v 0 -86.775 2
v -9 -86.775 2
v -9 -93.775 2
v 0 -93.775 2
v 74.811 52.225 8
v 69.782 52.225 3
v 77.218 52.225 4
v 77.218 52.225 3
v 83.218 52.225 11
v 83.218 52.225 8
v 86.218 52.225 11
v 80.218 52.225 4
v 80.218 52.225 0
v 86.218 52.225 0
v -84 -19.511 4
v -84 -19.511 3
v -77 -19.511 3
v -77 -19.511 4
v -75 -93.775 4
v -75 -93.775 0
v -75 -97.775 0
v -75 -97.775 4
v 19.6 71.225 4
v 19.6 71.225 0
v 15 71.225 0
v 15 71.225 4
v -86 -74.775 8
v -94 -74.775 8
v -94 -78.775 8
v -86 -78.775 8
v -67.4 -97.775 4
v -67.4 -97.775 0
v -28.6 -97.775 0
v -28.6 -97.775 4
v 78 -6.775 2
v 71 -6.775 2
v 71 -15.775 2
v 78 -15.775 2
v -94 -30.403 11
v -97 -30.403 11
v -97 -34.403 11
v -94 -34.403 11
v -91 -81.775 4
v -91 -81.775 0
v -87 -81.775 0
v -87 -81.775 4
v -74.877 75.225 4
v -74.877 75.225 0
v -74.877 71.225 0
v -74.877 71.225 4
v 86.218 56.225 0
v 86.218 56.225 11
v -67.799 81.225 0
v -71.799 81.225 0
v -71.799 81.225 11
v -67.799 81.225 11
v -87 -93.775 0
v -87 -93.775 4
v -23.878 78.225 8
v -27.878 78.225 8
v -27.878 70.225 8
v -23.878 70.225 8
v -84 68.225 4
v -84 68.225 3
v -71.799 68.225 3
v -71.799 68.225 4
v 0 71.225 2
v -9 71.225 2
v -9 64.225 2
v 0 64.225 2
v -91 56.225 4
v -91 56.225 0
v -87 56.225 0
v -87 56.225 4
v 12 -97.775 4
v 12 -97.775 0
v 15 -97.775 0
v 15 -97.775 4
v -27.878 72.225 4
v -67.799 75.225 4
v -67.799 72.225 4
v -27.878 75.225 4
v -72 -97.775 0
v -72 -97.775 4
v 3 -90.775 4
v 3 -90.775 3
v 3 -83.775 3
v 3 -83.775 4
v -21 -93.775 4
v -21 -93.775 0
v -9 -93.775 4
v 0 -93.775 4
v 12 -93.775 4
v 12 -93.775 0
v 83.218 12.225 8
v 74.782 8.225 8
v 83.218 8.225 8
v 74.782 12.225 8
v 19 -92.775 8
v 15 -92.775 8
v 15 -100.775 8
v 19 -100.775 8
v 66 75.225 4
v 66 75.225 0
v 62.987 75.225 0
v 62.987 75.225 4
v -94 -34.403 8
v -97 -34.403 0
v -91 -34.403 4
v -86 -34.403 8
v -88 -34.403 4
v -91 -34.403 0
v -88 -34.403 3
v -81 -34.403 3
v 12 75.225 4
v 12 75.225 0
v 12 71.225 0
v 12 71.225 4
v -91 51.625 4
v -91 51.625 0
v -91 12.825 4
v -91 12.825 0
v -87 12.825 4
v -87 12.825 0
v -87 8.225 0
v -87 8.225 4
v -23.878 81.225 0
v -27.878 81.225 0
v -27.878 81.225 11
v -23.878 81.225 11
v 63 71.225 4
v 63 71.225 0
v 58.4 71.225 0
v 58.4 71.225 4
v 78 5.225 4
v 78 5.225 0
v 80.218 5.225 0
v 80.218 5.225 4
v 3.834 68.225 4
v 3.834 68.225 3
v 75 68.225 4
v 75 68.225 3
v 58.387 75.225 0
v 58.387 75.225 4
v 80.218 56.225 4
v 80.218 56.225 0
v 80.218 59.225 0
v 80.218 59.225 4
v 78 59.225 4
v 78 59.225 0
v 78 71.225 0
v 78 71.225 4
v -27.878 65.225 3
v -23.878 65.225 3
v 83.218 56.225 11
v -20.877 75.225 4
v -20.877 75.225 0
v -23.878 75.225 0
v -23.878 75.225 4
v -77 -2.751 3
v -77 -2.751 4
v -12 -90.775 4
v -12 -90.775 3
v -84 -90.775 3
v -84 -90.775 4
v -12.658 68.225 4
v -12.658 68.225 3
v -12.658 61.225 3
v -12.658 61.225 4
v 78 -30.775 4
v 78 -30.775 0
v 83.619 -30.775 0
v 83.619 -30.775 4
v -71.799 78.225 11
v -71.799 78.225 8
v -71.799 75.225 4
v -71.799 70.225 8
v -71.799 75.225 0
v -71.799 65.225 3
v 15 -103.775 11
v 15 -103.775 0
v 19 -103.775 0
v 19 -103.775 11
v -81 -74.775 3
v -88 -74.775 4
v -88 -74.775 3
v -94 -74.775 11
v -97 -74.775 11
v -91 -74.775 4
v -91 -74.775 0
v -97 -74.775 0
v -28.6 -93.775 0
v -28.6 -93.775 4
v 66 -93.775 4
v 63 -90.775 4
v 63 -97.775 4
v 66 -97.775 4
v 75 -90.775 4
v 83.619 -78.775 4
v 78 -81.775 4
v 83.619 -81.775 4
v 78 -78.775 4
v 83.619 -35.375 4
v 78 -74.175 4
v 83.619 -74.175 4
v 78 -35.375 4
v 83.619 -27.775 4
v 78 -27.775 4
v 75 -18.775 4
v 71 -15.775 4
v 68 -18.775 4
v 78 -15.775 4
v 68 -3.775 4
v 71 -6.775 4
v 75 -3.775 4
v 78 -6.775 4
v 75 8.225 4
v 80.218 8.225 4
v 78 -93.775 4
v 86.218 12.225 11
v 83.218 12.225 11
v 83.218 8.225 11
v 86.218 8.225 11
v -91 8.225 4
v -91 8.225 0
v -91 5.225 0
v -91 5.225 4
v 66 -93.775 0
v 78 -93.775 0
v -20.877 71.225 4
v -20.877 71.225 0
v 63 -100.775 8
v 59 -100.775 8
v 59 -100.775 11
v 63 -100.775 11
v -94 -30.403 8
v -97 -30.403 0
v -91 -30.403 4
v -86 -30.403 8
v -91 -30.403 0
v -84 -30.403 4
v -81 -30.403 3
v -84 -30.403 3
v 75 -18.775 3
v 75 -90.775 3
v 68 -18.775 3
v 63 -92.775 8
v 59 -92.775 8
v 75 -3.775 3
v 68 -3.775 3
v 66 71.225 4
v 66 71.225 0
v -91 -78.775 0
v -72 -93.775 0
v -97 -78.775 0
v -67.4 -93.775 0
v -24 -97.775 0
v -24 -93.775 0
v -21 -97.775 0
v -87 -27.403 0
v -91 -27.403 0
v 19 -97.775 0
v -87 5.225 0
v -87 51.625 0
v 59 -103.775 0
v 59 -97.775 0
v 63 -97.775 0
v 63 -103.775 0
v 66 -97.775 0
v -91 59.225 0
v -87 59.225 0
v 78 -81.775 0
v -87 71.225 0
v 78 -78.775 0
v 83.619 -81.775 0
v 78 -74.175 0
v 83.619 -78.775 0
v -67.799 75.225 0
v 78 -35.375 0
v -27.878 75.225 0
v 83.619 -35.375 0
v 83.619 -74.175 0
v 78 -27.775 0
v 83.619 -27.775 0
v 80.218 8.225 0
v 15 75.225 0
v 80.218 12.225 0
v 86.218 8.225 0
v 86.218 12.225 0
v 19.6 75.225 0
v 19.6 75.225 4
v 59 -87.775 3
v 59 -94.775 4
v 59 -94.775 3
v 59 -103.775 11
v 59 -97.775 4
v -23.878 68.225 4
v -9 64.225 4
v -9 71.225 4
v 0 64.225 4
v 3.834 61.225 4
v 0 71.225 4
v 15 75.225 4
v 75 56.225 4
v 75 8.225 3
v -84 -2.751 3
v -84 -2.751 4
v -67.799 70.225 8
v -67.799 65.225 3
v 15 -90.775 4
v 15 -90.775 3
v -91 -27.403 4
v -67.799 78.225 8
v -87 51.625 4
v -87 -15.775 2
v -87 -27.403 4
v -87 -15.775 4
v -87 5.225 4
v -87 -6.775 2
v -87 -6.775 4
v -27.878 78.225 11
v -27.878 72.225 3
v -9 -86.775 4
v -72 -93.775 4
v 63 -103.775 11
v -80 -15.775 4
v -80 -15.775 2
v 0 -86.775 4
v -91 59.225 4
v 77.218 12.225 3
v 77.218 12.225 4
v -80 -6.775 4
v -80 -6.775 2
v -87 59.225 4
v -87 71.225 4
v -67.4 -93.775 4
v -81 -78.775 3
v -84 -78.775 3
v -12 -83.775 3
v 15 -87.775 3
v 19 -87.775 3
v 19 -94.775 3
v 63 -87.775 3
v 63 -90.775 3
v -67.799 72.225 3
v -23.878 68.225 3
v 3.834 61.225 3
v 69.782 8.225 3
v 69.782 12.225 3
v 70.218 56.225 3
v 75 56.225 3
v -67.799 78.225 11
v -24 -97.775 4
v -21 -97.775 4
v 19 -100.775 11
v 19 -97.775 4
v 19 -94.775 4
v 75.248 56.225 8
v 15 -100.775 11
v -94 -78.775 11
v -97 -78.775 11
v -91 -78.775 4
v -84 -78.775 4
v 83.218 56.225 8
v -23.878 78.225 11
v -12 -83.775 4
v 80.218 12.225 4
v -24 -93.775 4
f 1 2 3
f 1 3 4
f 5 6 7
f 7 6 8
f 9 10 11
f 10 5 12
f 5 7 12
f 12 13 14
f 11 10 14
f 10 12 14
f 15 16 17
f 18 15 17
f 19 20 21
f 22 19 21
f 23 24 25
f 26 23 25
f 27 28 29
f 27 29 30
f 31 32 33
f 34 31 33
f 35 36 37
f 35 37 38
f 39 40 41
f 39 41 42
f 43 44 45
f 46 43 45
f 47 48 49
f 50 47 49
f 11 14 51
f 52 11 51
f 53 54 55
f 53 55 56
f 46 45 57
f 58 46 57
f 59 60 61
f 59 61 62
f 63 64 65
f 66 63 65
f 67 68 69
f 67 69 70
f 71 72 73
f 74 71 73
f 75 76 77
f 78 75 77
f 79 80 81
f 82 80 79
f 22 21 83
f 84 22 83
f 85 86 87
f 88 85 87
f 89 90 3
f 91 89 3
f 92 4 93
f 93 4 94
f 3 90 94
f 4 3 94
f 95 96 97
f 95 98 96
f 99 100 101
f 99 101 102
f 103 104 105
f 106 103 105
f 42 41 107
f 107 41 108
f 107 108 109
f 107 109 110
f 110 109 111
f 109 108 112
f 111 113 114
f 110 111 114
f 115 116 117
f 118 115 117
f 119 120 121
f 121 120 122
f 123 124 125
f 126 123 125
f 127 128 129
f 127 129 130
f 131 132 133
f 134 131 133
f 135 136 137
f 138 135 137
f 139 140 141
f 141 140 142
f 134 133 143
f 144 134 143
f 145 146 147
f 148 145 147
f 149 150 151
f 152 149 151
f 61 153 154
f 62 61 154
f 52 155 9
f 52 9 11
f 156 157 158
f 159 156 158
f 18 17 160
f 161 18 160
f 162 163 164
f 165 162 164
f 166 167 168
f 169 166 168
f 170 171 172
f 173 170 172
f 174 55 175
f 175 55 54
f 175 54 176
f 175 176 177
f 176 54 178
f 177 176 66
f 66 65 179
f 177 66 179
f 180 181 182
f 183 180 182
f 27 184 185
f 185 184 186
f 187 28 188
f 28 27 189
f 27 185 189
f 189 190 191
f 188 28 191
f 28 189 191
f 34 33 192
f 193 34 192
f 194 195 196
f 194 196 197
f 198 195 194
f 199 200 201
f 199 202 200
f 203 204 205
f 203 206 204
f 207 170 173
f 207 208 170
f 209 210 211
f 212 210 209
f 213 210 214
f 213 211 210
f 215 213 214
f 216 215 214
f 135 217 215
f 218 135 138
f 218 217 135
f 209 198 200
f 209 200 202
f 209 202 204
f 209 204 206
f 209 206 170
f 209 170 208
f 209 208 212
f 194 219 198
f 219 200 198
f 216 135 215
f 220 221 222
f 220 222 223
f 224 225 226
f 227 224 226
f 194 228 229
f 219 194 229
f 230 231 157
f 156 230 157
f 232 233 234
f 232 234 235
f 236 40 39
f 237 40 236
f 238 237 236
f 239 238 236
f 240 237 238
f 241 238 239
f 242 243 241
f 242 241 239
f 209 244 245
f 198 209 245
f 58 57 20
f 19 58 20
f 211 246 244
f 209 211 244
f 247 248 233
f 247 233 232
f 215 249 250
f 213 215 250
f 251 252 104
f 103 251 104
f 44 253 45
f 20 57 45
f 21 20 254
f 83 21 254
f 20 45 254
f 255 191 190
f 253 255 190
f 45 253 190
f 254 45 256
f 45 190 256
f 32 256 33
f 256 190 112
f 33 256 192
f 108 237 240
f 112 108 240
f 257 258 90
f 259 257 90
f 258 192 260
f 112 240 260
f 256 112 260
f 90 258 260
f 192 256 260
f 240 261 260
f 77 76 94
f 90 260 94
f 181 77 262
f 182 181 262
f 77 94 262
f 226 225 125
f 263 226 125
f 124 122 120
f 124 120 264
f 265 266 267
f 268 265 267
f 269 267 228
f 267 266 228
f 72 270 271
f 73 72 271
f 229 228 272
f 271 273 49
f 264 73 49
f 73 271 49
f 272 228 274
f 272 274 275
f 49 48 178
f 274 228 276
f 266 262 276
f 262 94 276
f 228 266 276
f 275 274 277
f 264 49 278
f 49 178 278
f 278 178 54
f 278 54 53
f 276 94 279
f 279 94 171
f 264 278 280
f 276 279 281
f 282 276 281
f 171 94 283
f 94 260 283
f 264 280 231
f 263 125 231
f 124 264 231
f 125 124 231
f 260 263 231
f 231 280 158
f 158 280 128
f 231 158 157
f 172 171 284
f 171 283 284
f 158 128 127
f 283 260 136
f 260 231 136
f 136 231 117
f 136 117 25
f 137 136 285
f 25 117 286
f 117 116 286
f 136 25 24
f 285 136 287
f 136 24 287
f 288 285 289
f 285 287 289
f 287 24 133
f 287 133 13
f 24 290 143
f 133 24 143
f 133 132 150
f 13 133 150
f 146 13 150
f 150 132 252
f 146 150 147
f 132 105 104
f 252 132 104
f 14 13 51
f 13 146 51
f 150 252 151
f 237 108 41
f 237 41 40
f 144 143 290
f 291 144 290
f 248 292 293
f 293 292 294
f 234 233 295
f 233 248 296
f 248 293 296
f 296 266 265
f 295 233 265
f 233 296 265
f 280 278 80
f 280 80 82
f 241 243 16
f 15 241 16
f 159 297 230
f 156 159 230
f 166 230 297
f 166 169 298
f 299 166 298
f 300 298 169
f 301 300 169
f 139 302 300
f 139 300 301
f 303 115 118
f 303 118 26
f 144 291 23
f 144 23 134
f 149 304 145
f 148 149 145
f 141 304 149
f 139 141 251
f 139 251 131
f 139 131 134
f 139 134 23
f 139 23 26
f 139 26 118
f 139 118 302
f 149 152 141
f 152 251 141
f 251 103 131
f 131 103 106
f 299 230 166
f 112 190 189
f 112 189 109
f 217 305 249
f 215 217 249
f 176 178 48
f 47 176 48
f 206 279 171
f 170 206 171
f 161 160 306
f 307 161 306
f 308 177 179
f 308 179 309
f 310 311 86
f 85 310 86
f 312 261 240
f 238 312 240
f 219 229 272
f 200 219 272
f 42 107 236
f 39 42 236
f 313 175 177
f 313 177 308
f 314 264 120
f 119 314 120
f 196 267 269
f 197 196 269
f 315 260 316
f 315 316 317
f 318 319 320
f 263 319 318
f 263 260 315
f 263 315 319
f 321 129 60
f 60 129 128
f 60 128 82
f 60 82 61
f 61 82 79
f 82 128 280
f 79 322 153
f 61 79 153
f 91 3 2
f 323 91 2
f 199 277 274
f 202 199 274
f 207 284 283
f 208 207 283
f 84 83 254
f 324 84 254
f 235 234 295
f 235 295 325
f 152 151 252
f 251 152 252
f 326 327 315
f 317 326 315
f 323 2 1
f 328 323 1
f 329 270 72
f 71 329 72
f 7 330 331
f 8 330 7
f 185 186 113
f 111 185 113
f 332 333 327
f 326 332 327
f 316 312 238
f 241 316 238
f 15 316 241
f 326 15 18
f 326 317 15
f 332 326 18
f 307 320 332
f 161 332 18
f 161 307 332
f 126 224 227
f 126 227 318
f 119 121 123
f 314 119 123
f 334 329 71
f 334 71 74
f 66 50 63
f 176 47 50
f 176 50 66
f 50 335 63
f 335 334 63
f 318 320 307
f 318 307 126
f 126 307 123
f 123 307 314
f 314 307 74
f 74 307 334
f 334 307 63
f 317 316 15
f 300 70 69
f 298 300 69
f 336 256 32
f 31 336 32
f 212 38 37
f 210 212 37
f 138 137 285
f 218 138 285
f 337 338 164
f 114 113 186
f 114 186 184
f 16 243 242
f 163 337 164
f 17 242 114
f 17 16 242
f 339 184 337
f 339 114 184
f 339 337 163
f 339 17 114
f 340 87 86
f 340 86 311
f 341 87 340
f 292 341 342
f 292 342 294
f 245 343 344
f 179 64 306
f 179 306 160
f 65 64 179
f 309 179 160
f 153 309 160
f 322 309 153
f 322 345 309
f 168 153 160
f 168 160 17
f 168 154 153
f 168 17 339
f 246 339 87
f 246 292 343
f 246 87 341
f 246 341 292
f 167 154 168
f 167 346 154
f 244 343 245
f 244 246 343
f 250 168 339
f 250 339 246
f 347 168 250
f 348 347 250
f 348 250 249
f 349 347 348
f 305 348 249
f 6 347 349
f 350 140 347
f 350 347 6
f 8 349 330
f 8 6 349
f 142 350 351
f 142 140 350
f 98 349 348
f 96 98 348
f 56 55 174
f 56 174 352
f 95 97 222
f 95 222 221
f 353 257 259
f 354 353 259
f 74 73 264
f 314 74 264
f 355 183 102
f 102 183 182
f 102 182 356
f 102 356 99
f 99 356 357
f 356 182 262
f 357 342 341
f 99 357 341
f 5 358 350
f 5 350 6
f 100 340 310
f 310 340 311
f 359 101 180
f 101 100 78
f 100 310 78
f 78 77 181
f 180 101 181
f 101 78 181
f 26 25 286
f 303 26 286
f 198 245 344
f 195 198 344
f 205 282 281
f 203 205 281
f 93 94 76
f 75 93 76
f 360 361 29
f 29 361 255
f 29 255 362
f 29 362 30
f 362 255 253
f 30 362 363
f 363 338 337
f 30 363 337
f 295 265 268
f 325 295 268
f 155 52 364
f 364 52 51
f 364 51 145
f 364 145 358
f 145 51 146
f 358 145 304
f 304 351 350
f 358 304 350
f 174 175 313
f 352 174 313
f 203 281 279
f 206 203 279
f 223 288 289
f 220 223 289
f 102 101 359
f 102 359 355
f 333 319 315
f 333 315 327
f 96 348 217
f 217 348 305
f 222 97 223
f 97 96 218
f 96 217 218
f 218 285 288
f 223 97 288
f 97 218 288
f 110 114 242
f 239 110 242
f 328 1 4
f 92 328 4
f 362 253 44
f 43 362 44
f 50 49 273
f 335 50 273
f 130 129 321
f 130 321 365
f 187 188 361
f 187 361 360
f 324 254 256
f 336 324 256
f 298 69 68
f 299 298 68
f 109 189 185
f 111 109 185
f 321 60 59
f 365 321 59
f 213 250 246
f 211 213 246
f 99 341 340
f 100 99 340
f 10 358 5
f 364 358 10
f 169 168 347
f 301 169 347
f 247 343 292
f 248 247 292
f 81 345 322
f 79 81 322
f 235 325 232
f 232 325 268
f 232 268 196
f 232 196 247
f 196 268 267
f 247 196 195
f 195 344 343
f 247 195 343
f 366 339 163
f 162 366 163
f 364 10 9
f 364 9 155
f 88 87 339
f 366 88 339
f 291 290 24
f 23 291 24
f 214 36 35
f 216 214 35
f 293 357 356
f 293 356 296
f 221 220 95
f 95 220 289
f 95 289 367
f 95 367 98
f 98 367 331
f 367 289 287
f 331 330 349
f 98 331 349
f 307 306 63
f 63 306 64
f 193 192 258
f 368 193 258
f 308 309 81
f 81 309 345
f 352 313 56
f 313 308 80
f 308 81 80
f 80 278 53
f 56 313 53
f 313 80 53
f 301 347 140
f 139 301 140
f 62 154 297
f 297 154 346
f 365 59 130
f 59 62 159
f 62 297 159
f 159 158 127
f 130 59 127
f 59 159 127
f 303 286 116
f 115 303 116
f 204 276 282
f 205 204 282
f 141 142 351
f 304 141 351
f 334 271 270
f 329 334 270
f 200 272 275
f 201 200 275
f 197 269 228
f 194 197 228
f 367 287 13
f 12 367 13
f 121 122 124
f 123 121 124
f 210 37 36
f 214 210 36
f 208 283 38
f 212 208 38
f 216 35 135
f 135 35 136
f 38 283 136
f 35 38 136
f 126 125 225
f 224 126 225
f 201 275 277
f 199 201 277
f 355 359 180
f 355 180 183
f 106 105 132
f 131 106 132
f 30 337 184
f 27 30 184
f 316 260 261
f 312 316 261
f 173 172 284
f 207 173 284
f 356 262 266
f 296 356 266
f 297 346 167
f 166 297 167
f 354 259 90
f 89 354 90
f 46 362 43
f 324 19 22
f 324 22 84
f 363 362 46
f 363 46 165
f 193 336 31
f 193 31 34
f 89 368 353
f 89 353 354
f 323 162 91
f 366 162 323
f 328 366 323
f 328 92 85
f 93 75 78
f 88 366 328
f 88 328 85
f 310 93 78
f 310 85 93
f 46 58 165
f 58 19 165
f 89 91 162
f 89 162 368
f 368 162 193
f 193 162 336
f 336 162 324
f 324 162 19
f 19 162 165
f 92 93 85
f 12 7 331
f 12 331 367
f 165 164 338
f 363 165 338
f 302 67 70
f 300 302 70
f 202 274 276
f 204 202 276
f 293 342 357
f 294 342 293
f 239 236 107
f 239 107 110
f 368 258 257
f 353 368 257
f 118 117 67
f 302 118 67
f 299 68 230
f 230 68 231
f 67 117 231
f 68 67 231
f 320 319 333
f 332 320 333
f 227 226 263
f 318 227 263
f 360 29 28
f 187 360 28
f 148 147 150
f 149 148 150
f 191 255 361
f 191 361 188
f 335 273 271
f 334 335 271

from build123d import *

# Parameters (mm, degrees)
F1_DEPTH = 3
F0_W     = 39.9216501117
F0_H     = 3
F0_W_2   = 3
F0_H_2   = 40
F0_W_3   = 40
F0_H_3   = 40.3722185198
F2_DEPTH = 4
F0_W_4   = 7
F0_H_4   = 9
F0_W_5   = 9
F0_H_5   = 7
F3_DEPTH = 2
F4_DEPTH = 8
F0_H_6   = 4
F0_W_6   = 4
F5_DEPTH = 11
F6_SIZE  = 4.99999


# Not quite as in the source:
# - a fillet or chamfer is up to 0.001 mm smaller than in the source, because OpenCascade refuses the exact size


with BuildPart() as f1:
    # F0 (on Top) → F1 (new body)
    with BuildSketch(Plane.XY):
        Polygon((-71.7994198203, 65.224928081), (-71.7994198203, 68.224928081), (-84, 68.224928081), (-84, -2.7506086044), (-77, -2.7506086044), (-77, -19.5105448365), (-84, -19.5105448365), (-84, -30.4028533991), (-81, -30.4028533991), (-81, -34.4028533991), (-88, -34.4028533991), (-88, -74.775071919), (-81, -74.775071919), (-81, -78.775071919), (-84, -78.775071919), (-84, -90.775071919), (-12, -90.775071919), (-12, -83.775071919), (3, -83.775071919), (3, -90.775071919), (15, -90.775071919), (15, -87.775071919), (19, -87.775071919), (19, -94.775071919), (59, -94.775071919), (59, -87.775071919), (63, -87.775071919), (63, -90.775071919), (75, -90.775071919), (75, -18.775071919), (68.6397999525, -18.775071919), (68, -18.775071919), (68, -3.775071919), (75, -3.775071919), (75, 8.224928081), (69.781611979, 8.224928081), (69.781611979, 12.224928081), (77.218388021, 12.224928081), (77.218388021, 52.224928081), (69.781611979, 52.224928081), (70.218388021, 56.224928081), (75, 56.224928081), (75, 68.224928081), (3.8335430436, 68.224928081), (3.8335430436, 61.224928081), (-12.6577513292, 61.224928081), (-12.6577513292, 68.224928081), (-23.8777697086, 68.224928081), (-23.8777697086, 65.224928081), (-27.8777697086, 65.224928081), (-27.8777697086, 72.224928081), (-67.7994198203, 72.224928081), (-67.7994198203, 65.224928081), align=None)
    extrude(amount=F1_DEPTH)

    # F0 (on Top) → F2 (join)
    with BuildSketch(Plane.XY):
        Polygon((-74.8768895864, 71.224928081), (-87, 71.224928081), (-87, 59.224928081), (-91, 59.224928081), (-91, 56.224928081), (-87, 56.224928081), (-87, 51.624928081), (-91, 51.624928081), (-91, 12.824928081), (-87, 12.824928081), (-87, 8.224928081), (-91, 8.224928081), (-91, 5.224928081), (-87, 5.224928081), (-87, -6.775071919), (-80, -6.775071919), (-80, -15.775071919), (-87, -15.775071919), (-87, -27.4028533991), (-91, -27.4028533991), (-91, -30.4028533991), (-84, -30.4028533991), (-84, -19.5105448365), (-77, -19.5105448365), (-77, -2.7506086044), (-84, -2.7506086044), (-84, 68.224928081), (-71.7994198203, 68.224928081), (-71.7994198203, 75.224928081), (-74.8768895864, 75.224928081), align=None)
        with Locations((-47.8385947645, 73.724928081)):
            Rectangle(F0_W, F0_H)
        Polygon((-20.8768895864, 75.224928081), (-23.8777697086, 75.224928081), (-23.8777697086, 68.224928081), (-12.6577513292, 68.224928081), (-12.6577513292, 61.224928081), (3.8335430436, 61.224928081), (3.8335430436, 68.224928081), (75, 68.224928081), (75, 56.224928081), (80.218388021, 56.224928081), (80.218388021, 59.224928081), (78, 59.224928081), (78, 71.224928081), (66, 71.224928081), (66, 75.224928081), (62.9867989421, 75.224928081), (63, 71.224928081), (58.4, 71.224928081), (58.3867989421, 75.224928081), (19.6, 75.224928081), (19.6, 71.224928081), (15, 71.224928081), (15, 75.224928081), (12, 75.224928081), (12, 71.224928081), (0, 71.224928081), (0, 64.224928081), (-9, 64.224928081), (-9, 71.224928081), (-20.8768895864, 71.224928081), align=None)
        with Locations((78.718388021, 32.224928081)):
            Rectangle(F0_W_2, F0_H_2)
        Polygon((79.781611979, 8.224928081), (75, 8.224928081), (75, -3.775071919), (68, -3.775071919), (68, -18.775071919), (68.6397999525, -18.775071919), (75, -18.775071919), (75, -90.775071919), (63, -90.775071919), (63, -97.775071919), (66, -97.775071919), (66, -93.775071919), (78, -93.775071919), (78, -81.775071919), (83.6185051799, -81.775071919), (83.6185051799, -78.775071919), (78, -78.775071919), (78, -74.175071919), (83.6185051799, -74.175071919), (83.6185051799, -35.375071919), (78, -35.375071919), (78, -30.775071919), (83.6185051799, -30.775071919), (83.6185051799, -27.775071919), (78, -27.775071919), (78, -15.775071919), (71, -15.775071919), (71, -6.775071919), (78, -6.775071919), (78, 5.224928081), (80.218388021, 5.224928081), (80.218388021, 8.224928081), align=None)
        with Locations((39, -96.275071919)):
            Rectangle(F0_W_3, F0_H)
        Polygon((-84, -90.775071919), (-84, -78.775071919), (-91, -78.775071919), (-91, -81.775071919), (-87, -81.775071919), (-87, -93.775071919), (-75, -93.775071919), (-75, -97.775071919), (-72, -97.775071919), (-72, -93.775071919), (-67.4, -93.775071919), (-67.4, -97.775071919), (-28.6, -97.775071919), (-28.6, -93.775071919), (-24, -93.775071919), (-24, -97.775071919), (-21, -97.775071919), (-21, -93.775071919), (-9, -93.775071919), (-9, -86.775071919), (0, -86.775071919), (0, -93.775071919), (12, -93.775071919), (12, -97.775071919), (15, -97.775071919), (15, -97.4028533991), (15, -90.775071919), (3, -90.775071919), (3, -83.775071919), (-12, -83.775071919), (-12, -90.775071919), align=None)
        with Locations((-89.5, -54.5889626591)):
            Rectangle(F0_W_2, F0_H_3)
    extrude(amount=F2_DEPTH)

    # F0 (on Top) → F3 (join)
    with BuildSketch(Plane.XY):
        with Locations((-83.5, -11.275071919)):
            Rectangle(F0_W_4, F0_H_4)
        with Locations((-4.5, 67.724928081)):
            Rectangle(F0_W_5, F0_H_5)
        with Locations((74.5, -11.275071919)):
            Rectangle(F0_W_4, F0_H_4)
        with Locations((-4.5, -90.275071919)):
            Rectangle(F0_W_5, F0_H_5)
    extrude(amount=F3_DEPTH)

    # F0 (on Top) → F4 (join)
    with BuildSketch(Plane.XY):
        Polygon((-71.7994198203, 78.224928081), (-71.7994198203, 75.224928081), (-71.7994198203, 68.224928081), (-71.7994198203, 65.224928081), (-67.7994198203, 65.224928081), (-67.7994198203, 72.224928081), (-67.7994198203, 75.224928081), (-67.7994198203, 78.224928081), align=None)
        Polygon((-27.8777697086, 78.224928081), (-27.8777697086, 75.224928081), (-27.8777697086, 72.224928081), (-27.8777697086, 65.224928081), (-23.8777697086, 65.224928081), (-23.8777697086, 68.224928081), (-23.8777697086, 75.224928081), (-23.8777697086, 78.224928081), align=None)
        Polygon((80.218388021, 56.224928081), (75, 56.224928081), (70.218388021, 56.224928081), (69.781611979, 52.224928081), (77.218388021, 52.224928081), (80.218388021, 52.224928081), (83.218388021, 52.224928081), (83.218388021, 56.224928081), align=None)
        Polygon((80.218388021, 12.224928081), (77.218388021, 12.224928081), (69.781611979, 12.224928081), (69.781611979, 8.224928081), (75, 8.224928081), (79.781611979, 8.224928081), (80.218388021, 8.224928081), (83.218388021, 8.224928081), (83.218388021, 12.224928081), align=None)
        Polygon((59, -87.775071919), (59, -94.775071919), (59, -97.775071919), (59, -100.775071919), (63, -100.775071919), (63, -97.775071919), (63, -90.775071919), (63, -87.775071919), align=None)
        Polygon((15, -87.775071919), (15, -90.775071919), (15, -97.4028533991), (15, -97.775071919), (15, -100.775071919), (19, -100.775071919), (19, -97.775071919), (19, -94.775071919), (19, -87.775071919), align=None)
        Polygon((-81, -30.4028533991), (-84, -30.4028533991), (-91, -30.4028533991), (-94, -30.4028533991), (-94, -34.4028533991), (-91, -34.4028533991), (-88, -34.4028533991), (-81, -34.4028533991), align=None)
        Polygon((-81, -74.775071919), (-88, -74.775071919), (-91, -74.775071919), (-91.2415088892, -74.775071919), (-94, -74.775071919), (-94, -78.775071919), (-91, -78.775071919), (-84, -78.775071919), (-81, -78.775071919), align=None)
    extrude(amount=F4_DEPTH)

    # F0 (on Top) → F5 (join)
    with BuildSketch(Plane.XY):
        with Locations((-95.5, -32.4028533991)):
            Rectangle(F0_W_2, F0_H_6)
        with Locations((-95.5, -76.775071919)):
            Rectangle(F0_W_2, F0_H_6)
        with Locations((17, -102.275071919)):
            Rectangle(F0_W_6, F0_H)
        with Locations((61, -102.275071919)):
            Rectangle(F0_W_6, F0_H)
        with Locations((84.718388021, 10.224928081)):
            Rectangle(F0_W_2, F0_H_6)
        with Locations((84.718388021, 54.224928081)):
            Rectangle(F0_W_2, F0_H_6)
        with Locations((-25.8777697086, 79.724928081)):
            Rectangle(F0_W_6, F0_H)
        with Locations((-69.7994198203, 79.724928081)):
            Rectangle(F0_W_6, F0_H)
    extrude(amount=F5_DEPTH)

    # F6 (size 5 in the source; OpenCascade refuses exactly that, so slightly less here)
    f6_edges = [f1.edges().sort_by_distance(p)[0] for p in [
        (-69.79942, 65.224928, 8),
        (-25.87777, 65.224928, 8),
        (70, 54.224928, 8),
        (69.781612, 10.224928, 8),
        (-81, -76.775072, 8),
        (-81, -32.402853, 8),
        (61, -87.775072, 8),
        (17, -87.775072, 8),
    ]]
    chamfer(f6_edges, length=F6_SIZE)


solid = f1.part
